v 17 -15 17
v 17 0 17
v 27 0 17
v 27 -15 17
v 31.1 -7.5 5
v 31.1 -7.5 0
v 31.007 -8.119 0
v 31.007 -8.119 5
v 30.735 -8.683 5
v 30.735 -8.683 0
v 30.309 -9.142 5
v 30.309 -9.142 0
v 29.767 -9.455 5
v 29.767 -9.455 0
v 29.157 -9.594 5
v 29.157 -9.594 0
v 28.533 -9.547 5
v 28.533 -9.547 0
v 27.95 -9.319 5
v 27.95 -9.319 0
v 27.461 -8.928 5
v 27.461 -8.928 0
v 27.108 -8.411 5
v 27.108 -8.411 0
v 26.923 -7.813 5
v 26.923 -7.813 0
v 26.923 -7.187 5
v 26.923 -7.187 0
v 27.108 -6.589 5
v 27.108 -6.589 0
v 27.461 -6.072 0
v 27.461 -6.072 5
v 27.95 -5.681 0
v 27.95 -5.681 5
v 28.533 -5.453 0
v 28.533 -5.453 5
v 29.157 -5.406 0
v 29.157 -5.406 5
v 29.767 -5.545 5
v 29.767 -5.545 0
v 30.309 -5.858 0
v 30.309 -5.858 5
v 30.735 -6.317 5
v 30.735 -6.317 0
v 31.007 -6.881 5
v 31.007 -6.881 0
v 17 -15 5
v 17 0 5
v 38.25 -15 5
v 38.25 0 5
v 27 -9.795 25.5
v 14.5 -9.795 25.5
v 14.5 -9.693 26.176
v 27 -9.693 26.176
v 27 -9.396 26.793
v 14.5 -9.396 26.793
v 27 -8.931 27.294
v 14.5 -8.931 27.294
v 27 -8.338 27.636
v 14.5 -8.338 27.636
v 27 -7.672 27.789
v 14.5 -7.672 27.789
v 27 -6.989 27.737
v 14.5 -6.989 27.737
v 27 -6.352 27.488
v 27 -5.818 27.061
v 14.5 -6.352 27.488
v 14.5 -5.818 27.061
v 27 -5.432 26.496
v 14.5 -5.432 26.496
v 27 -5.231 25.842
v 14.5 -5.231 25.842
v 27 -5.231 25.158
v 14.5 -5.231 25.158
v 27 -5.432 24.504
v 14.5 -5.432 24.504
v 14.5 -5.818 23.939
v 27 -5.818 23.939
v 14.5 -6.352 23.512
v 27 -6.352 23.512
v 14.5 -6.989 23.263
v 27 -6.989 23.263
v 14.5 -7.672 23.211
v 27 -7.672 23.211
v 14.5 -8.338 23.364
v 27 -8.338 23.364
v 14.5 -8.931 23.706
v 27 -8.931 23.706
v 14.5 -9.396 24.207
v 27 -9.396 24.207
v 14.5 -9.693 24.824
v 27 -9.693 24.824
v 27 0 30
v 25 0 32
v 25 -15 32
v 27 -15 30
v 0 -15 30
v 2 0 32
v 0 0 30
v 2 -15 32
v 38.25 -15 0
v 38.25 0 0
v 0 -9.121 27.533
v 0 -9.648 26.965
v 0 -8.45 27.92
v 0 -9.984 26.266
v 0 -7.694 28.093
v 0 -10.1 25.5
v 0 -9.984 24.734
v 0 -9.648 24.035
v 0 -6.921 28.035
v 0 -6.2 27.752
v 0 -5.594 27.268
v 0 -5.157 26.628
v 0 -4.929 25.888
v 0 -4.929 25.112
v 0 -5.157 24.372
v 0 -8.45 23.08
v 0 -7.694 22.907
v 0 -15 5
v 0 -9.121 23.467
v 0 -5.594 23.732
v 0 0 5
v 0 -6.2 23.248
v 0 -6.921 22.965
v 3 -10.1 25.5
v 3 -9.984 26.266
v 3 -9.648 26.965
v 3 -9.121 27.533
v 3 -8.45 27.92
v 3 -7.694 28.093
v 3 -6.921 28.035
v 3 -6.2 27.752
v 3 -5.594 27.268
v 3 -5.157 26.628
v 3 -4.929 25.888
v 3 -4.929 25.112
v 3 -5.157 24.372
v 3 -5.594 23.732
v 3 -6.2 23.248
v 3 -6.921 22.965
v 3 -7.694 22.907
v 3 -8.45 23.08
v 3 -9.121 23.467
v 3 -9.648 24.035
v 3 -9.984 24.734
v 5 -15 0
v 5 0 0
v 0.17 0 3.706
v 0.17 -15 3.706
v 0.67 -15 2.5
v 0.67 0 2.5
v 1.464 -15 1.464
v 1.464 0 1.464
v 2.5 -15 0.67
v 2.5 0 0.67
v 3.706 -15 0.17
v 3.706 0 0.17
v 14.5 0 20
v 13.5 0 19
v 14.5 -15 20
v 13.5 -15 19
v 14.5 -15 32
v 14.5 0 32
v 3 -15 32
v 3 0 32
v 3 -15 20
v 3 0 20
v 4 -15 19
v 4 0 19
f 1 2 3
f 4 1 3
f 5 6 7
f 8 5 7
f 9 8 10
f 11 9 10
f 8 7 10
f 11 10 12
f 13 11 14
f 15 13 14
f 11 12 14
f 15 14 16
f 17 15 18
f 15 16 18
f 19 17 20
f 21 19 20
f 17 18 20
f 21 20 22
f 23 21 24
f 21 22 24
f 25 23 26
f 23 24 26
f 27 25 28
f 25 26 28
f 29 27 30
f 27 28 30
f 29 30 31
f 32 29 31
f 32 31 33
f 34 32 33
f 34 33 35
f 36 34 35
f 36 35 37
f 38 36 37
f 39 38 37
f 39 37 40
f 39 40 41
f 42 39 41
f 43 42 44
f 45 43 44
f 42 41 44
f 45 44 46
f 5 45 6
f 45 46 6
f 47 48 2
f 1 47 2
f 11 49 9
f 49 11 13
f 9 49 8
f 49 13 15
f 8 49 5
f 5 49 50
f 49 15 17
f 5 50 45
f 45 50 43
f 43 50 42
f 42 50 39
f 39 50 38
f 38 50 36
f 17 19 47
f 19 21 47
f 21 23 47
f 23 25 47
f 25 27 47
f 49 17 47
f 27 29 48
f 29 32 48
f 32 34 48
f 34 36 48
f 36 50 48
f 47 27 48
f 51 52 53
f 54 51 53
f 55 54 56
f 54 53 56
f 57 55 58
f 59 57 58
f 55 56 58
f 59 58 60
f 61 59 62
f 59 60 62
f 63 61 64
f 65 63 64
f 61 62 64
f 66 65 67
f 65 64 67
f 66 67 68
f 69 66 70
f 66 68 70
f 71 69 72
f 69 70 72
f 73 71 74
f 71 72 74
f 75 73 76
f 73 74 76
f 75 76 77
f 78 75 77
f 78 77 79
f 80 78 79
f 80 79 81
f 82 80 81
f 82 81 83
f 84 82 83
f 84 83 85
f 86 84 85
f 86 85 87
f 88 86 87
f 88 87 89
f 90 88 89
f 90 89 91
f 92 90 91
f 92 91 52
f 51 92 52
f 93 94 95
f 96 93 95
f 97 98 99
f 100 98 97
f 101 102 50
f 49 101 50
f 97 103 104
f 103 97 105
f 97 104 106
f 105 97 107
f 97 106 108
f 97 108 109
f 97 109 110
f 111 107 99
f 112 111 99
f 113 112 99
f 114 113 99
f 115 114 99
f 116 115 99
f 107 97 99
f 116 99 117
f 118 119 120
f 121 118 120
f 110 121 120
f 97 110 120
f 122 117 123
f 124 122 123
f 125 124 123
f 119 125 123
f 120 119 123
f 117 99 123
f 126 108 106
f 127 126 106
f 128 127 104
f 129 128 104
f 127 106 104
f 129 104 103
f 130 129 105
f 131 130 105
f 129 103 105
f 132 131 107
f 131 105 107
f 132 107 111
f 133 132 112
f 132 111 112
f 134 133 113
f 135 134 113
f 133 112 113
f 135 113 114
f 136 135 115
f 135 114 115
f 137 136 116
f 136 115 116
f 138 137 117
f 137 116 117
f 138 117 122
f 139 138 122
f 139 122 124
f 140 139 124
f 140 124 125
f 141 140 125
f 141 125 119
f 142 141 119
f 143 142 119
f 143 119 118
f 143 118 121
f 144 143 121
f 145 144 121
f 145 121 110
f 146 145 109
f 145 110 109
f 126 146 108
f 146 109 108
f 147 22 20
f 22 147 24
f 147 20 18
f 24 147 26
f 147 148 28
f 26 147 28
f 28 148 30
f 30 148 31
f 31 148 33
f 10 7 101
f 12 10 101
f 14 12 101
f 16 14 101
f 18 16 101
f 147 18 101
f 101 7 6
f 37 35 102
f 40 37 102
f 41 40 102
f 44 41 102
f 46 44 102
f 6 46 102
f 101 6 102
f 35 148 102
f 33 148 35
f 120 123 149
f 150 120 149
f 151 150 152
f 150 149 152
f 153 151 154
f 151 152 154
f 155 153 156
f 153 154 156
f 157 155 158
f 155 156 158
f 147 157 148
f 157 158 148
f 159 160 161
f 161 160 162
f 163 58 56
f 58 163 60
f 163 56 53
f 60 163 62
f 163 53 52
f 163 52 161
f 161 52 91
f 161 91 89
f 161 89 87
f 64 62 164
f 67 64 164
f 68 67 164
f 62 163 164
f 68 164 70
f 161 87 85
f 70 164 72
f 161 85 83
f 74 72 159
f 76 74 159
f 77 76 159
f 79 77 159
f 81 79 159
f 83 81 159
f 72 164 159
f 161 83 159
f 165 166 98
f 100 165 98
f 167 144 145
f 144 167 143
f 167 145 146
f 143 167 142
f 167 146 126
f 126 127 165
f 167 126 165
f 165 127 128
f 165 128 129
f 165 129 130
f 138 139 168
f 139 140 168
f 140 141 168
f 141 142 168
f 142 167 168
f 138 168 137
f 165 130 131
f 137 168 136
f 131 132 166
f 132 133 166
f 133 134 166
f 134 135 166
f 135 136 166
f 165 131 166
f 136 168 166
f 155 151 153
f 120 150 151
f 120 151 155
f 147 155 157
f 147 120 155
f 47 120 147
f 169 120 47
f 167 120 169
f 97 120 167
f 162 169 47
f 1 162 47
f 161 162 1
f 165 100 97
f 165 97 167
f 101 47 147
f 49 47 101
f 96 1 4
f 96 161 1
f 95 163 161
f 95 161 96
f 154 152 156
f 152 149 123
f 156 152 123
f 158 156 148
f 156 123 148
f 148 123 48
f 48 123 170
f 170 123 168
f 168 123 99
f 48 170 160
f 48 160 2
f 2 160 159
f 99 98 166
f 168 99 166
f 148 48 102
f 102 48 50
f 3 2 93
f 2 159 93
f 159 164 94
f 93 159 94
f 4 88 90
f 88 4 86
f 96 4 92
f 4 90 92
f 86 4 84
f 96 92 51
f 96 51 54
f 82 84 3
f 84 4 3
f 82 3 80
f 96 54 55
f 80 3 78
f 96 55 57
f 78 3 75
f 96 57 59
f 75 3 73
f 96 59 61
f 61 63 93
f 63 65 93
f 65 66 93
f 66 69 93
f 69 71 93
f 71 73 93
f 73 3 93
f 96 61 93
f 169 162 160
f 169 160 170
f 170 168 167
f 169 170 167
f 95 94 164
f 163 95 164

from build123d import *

# Parameters (mm, degrees)
F1_DEPTH = 15
F2_R     = 2.1
F3_DEPTH = 5
F4_R     = 2.295
F5_DEPTH = 38.251
F6_R     = 2.6
F6_R_2   = 2.295
F7_DEPTH = 3
F8_SIZE  = 2
F9_SIZE  = 1


with BuildPart() as f1:
    # F0 (on Front) → F1 (new body)
    with BuildSketch(Plane.XZ):
        with BuildLine():
            ThreePointArc((0, 5), (1.464466, 1.464466), (5, 0))
            Line((5, 0), (38.25, 0))
            Line((38.25, 0), (38.25, 5))
            Line((38.25, 5), (17, 5))
            Line((17, 5), (17, 17))
            Line((17, 17), (27, 17))
            Line((27, 17), (27, 32))
            Line((27, 32), (14.5, 32))
            Line((14.5, 32), (14.5, 19))
            Line((14.5, 19), (3, 19))
            Line((3, 19), (3, 32))
            Line((3, 32), (0, 32))
            Line((0, 32), (0, 5))
        make_face()
    extrude(amount=F1_DEPTH)

    # F2 (on face) → F3 (cut, through all)
    with BuildSketch(Plane(origin=(0, 0, 0), x_dir=(1, 0, 0), z_dir=(0, 0, -1))):
        with Locations((29, 7.5)):
            Circle(F2_R)
    extrude(amount=-F3_DEPTH, mode=Mode.SUBTRACT)

    # F4 (on face) → F5 (cut, through all)
    with BuildSketch(Plane(origin=(0, 0, 0), x_dir=(0, -1, 0), z_dir=(-1, 0, 0))):
        with Locations((7.5, 25.5)):
            Circle(F4_R)
    extrude(amount=-F5_DEPTH, mode=Mode.SUBTRACT)

    # F6 (on face) → F7 (cut, through all)
    with BuildSketch(Plane(origin=(0, 0, 0), x_dir=(0, -1, 0), z_dir=(-1, 0, 0))):
        with Locations((7.5, 25.5)):
            Circle(F6_R)
        with Locations((7.5, 25.5)):
            Circle(F6_R_2, mode=Mode.SUBTRACT)
    extrude(amount=-F7_DEPTH, mode=Mode.SUBTRACT)

    # F8
    f8_edges = [f1.edges().sort_by_distance(p)[0] for p in [
        (27, -7.5, 32),
        (0, -7.5, 32),
    ]]
    chamfer(f8_edges, length=F8_SIZE)

    # F9
    f9_edges = [f1.edges().sort_by_distance(p)[0] for p in [
        (3, -7.5, 19),
        (14.5, -7.5, 19),
    ]]
    chamfer(f9_edges, length=F9_SIZE)


solid = f1.part
